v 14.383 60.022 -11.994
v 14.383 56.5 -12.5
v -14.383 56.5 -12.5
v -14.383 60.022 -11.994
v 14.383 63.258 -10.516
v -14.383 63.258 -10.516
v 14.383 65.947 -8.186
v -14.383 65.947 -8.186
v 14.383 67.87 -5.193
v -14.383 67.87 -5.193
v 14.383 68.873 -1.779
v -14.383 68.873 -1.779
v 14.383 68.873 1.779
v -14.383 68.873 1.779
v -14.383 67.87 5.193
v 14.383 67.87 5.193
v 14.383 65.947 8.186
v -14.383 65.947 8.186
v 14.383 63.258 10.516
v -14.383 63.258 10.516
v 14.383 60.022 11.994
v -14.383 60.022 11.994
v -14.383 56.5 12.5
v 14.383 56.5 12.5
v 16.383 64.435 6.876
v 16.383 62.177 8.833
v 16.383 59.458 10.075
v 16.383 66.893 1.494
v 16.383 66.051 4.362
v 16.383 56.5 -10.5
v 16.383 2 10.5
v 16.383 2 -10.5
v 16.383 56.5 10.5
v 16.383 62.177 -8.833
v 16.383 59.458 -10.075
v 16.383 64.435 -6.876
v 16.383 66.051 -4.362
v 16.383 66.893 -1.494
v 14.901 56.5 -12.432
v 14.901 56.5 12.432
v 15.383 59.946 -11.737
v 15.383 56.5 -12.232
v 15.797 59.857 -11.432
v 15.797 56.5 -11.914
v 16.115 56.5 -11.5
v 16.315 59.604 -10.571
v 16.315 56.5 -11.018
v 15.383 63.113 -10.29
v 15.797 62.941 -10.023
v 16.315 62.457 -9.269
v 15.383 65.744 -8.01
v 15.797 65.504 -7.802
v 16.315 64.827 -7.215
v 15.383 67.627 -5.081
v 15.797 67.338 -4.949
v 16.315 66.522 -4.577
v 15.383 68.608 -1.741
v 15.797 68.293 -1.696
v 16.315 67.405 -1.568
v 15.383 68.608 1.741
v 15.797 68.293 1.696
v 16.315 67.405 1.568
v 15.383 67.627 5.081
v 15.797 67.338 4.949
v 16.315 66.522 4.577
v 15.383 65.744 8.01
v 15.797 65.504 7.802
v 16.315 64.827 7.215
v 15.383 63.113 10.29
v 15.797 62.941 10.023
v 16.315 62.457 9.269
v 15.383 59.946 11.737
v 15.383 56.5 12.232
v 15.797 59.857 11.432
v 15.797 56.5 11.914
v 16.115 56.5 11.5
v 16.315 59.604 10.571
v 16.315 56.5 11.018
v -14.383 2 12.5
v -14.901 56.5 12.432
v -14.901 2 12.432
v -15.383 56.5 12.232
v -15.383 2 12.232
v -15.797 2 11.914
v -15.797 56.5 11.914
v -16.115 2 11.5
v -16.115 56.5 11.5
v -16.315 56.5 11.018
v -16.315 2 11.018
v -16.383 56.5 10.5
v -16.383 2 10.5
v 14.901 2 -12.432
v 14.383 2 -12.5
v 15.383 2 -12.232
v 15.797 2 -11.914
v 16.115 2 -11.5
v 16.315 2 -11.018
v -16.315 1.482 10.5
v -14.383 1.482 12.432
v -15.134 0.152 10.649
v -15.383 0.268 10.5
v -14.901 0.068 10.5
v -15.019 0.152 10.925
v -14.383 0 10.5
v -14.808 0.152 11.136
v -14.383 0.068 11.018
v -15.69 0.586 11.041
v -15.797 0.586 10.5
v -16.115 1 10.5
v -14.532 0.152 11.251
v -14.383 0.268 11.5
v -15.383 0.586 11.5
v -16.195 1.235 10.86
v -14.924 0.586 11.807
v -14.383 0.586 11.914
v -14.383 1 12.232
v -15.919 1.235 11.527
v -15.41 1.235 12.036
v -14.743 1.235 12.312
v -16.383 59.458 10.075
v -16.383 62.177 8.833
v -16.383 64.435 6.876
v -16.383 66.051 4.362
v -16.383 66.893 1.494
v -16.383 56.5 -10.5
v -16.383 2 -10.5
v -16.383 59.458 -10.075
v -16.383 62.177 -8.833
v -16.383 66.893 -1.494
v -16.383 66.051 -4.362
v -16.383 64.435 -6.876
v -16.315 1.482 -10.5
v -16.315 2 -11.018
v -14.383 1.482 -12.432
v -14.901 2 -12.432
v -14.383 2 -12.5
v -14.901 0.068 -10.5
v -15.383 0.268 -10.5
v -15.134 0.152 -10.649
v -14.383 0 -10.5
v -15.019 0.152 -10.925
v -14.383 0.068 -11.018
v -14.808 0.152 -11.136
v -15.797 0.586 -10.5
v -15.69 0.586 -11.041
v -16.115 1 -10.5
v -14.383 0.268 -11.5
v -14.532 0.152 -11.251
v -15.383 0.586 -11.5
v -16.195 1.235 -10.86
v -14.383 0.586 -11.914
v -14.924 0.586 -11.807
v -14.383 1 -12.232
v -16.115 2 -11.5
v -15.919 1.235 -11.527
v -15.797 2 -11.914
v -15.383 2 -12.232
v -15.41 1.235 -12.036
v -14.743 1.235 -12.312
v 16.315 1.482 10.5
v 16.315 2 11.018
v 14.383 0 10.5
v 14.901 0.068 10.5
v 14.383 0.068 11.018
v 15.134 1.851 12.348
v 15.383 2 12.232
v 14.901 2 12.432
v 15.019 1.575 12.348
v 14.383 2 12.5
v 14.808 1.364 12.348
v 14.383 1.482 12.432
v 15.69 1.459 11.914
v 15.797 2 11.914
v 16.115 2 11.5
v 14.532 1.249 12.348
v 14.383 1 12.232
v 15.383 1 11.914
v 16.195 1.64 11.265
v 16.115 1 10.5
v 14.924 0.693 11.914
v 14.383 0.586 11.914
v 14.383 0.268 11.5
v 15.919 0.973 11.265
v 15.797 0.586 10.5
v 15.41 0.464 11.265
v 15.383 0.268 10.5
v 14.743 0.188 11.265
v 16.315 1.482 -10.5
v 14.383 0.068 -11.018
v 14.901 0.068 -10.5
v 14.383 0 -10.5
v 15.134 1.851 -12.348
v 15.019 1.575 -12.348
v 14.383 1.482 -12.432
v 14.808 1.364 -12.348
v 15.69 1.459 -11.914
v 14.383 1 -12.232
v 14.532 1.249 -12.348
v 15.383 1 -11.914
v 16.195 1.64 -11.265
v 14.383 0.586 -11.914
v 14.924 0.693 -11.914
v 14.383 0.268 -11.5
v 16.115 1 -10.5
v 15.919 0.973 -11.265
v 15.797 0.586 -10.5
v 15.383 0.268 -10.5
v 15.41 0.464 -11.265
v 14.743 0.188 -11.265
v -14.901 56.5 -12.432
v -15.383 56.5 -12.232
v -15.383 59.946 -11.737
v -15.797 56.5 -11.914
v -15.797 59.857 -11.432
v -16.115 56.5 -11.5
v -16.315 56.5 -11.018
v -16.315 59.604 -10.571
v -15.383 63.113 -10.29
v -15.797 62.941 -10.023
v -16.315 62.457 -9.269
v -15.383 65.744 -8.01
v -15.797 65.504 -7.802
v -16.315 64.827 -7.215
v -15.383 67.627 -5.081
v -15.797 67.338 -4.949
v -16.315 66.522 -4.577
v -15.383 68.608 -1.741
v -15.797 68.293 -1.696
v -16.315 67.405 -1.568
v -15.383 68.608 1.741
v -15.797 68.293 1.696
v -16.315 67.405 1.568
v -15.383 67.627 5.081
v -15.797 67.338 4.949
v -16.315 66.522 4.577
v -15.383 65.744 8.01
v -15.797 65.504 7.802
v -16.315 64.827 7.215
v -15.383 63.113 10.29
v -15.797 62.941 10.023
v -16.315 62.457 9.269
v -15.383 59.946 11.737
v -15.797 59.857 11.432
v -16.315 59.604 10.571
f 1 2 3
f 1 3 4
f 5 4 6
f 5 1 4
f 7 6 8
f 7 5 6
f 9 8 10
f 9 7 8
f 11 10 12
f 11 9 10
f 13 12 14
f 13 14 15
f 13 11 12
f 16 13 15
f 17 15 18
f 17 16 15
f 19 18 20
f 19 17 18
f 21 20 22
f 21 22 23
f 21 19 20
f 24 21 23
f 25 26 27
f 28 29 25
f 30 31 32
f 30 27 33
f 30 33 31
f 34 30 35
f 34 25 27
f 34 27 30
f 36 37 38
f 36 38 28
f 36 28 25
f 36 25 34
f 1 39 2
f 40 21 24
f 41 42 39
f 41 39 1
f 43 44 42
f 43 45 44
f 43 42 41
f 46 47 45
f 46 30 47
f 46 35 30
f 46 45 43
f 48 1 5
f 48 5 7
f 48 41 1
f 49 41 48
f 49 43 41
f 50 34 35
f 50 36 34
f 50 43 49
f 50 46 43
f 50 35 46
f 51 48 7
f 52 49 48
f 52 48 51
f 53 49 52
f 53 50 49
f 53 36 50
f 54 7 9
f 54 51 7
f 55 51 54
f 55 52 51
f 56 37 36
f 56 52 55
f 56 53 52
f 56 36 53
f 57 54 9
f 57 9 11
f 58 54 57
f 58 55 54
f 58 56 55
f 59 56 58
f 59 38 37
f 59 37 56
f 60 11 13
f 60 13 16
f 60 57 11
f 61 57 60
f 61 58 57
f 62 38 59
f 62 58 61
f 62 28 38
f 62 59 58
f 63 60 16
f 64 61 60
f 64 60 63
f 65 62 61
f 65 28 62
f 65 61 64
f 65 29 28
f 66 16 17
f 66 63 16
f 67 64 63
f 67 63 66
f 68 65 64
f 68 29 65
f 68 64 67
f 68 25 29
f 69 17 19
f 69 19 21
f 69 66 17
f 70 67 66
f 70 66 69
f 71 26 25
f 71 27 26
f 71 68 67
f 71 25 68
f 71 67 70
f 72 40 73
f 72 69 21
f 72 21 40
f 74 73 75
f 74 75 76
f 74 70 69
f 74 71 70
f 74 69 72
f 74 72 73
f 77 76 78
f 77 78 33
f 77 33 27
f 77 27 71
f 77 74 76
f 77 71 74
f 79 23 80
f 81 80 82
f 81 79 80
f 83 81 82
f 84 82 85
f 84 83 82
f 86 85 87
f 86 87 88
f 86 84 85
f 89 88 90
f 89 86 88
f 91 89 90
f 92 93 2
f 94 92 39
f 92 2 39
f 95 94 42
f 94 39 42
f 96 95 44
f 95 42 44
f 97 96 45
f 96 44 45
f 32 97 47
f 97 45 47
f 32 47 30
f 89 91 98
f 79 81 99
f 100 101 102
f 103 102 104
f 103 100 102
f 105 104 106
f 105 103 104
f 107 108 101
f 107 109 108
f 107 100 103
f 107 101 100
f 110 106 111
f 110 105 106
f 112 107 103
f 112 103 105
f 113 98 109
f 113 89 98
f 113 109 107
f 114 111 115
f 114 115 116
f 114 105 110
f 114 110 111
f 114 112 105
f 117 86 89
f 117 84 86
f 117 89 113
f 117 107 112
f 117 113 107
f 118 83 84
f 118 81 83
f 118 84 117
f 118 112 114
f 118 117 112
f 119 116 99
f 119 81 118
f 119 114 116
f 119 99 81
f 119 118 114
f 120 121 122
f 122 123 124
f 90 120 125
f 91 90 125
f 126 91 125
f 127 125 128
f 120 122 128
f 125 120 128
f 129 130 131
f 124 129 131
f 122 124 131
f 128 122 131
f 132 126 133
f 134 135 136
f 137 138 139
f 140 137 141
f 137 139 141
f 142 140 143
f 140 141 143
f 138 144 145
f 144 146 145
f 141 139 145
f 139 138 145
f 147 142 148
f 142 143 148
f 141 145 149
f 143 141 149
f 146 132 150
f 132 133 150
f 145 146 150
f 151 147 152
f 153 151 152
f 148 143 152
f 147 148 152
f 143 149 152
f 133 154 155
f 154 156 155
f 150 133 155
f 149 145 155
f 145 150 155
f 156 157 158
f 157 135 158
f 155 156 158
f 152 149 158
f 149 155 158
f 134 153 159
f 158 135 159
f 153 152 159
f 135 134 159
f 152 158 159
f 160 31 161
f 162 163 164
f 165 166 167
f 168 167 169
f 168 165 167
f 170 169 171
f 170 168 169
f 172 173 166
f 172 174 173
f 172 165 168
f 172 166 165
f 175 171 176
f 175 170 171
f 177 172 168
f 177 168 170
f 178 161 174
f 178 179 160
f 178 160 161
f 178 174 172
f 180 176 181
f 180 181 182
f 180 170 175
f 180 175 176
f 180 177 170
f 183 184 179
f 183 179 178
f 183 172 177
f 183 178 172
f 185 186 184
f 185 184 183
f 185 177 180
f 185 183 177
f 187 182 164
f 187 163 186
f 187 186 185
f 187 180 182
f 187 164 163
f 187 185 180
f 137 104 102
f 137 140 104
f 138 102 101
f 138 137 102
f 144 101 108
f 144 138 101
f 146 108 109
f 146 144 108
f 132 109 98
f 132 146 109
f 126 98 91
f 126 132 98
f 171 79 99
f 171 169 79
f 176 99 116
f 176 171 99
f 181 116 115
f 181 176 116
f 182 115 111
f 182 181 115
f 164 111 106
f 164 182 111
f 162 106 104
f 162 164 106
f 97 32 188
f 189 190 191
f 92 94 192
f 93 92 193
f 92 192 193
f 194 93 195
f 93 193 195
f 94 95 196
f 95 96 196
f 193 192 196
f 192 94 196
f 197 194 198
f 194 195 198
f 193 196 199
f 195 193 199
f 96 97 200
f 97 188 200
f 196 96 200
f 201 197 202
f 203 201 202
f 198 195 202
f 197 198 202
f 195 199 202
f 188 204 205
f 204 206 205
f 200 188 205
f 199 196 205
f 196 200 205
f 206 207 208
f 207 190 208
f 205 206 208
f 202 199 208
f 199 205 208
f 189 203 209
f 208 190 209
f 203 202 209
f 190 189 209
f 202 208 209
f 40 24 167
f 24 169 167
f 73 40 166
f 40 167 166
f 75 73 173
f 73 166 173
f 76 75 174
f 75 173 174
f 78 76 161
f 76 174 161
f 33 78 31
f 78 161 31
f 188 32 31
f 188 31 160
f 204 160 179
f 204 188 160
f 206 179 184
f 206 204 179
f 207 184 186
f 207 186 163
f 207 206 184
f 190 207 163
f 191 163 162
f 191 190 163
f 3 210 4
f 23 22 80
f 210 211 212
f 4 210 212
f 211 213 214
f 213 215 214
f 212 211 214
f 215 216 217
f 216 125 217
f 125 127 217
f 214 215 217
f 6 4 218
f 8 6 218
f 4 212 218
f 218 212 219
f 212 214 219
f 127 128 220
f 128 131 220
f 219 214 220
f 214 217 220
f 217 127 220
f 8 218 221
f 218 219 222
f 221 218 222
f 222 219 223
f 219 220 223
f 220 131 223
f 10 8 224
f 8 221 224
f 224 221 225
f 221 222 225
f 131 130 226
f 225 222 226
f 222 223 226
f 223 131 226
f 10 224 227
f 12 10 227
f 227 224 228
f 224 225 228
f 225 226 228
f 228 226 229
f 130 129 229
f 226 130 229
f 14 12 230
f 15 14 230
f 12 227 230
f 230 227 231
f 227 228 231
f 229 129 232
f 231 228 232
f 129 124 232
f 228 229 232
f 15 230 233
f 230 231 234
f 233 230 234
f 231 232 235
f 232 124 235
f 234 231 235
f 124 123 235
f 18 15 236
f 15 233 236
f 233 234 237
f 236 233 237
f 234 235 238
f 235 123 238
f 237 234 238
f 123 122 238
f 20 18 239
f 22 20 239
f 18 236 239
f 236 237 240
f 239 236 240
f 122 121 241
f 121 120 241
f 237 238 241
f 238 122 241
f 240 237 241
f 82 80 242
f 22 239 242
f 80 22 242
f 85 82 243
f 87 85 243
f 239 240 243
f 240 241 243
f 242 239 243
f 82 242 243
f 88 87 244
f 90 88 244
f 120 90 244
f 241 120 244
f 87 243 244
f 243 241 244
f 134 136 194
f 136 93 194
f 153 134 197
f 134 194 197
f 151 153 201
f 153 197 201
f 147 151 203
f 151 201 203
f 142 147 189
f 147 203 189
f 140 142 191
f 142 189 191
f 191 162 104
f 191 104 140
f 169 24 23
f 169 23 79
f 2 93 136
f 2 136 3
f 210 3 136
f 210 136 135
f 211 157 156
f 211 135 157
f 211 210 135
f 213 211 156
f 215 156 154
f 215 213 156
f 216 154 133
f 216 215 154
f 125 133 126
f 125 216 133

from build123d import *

# Parameters (mm, degrees)
BOSS_EXTRUDE1_DEPTH = 16.383
FILLET1_R           = 2


with BuildPart() as part:
    # Sketch1 → Boss-Extrude1 (new, symmetric)
    with BuildSketch(Plane(origin=(0, 0, 0), x_dir=(0, 0, -1), z_dir=(1, 0, 0))):
        with BuildLine():
            Line((-12.5, 56.5), (-12.5, 0))
            Line((-12.5, 0), (12.5, 0))
            Line((12.5, 0), (12.5, 56.5))
            ThreePointArc((12.5, 56.5), (0, 69), (-12.5, 56.5))
        make_face()
    extrude(amount=BOSS_EXTRUDE1_DEPTH, both=True)

    # Fillet1
    fillet1_edges = [part.edges().sort_by_distance(p)[0] for p in [
        (16.383, 0, 0),
        (16.383, 28.25, -12.5),
        (16.383, 69, 0),
        (-16.383, 28.25, -12.5),
        (-16.383, 0, 0),
        (-16.383, 28.25, 12.5),
        (-16.383, 69, 0),
        (0, 0, -12.5),
        (0, 0, 12.5),
        (16.383, 28.25, 12.5),
    ]]
    fillet(fillet1_edges, radius=FILLET1_R)


solid = part.part
